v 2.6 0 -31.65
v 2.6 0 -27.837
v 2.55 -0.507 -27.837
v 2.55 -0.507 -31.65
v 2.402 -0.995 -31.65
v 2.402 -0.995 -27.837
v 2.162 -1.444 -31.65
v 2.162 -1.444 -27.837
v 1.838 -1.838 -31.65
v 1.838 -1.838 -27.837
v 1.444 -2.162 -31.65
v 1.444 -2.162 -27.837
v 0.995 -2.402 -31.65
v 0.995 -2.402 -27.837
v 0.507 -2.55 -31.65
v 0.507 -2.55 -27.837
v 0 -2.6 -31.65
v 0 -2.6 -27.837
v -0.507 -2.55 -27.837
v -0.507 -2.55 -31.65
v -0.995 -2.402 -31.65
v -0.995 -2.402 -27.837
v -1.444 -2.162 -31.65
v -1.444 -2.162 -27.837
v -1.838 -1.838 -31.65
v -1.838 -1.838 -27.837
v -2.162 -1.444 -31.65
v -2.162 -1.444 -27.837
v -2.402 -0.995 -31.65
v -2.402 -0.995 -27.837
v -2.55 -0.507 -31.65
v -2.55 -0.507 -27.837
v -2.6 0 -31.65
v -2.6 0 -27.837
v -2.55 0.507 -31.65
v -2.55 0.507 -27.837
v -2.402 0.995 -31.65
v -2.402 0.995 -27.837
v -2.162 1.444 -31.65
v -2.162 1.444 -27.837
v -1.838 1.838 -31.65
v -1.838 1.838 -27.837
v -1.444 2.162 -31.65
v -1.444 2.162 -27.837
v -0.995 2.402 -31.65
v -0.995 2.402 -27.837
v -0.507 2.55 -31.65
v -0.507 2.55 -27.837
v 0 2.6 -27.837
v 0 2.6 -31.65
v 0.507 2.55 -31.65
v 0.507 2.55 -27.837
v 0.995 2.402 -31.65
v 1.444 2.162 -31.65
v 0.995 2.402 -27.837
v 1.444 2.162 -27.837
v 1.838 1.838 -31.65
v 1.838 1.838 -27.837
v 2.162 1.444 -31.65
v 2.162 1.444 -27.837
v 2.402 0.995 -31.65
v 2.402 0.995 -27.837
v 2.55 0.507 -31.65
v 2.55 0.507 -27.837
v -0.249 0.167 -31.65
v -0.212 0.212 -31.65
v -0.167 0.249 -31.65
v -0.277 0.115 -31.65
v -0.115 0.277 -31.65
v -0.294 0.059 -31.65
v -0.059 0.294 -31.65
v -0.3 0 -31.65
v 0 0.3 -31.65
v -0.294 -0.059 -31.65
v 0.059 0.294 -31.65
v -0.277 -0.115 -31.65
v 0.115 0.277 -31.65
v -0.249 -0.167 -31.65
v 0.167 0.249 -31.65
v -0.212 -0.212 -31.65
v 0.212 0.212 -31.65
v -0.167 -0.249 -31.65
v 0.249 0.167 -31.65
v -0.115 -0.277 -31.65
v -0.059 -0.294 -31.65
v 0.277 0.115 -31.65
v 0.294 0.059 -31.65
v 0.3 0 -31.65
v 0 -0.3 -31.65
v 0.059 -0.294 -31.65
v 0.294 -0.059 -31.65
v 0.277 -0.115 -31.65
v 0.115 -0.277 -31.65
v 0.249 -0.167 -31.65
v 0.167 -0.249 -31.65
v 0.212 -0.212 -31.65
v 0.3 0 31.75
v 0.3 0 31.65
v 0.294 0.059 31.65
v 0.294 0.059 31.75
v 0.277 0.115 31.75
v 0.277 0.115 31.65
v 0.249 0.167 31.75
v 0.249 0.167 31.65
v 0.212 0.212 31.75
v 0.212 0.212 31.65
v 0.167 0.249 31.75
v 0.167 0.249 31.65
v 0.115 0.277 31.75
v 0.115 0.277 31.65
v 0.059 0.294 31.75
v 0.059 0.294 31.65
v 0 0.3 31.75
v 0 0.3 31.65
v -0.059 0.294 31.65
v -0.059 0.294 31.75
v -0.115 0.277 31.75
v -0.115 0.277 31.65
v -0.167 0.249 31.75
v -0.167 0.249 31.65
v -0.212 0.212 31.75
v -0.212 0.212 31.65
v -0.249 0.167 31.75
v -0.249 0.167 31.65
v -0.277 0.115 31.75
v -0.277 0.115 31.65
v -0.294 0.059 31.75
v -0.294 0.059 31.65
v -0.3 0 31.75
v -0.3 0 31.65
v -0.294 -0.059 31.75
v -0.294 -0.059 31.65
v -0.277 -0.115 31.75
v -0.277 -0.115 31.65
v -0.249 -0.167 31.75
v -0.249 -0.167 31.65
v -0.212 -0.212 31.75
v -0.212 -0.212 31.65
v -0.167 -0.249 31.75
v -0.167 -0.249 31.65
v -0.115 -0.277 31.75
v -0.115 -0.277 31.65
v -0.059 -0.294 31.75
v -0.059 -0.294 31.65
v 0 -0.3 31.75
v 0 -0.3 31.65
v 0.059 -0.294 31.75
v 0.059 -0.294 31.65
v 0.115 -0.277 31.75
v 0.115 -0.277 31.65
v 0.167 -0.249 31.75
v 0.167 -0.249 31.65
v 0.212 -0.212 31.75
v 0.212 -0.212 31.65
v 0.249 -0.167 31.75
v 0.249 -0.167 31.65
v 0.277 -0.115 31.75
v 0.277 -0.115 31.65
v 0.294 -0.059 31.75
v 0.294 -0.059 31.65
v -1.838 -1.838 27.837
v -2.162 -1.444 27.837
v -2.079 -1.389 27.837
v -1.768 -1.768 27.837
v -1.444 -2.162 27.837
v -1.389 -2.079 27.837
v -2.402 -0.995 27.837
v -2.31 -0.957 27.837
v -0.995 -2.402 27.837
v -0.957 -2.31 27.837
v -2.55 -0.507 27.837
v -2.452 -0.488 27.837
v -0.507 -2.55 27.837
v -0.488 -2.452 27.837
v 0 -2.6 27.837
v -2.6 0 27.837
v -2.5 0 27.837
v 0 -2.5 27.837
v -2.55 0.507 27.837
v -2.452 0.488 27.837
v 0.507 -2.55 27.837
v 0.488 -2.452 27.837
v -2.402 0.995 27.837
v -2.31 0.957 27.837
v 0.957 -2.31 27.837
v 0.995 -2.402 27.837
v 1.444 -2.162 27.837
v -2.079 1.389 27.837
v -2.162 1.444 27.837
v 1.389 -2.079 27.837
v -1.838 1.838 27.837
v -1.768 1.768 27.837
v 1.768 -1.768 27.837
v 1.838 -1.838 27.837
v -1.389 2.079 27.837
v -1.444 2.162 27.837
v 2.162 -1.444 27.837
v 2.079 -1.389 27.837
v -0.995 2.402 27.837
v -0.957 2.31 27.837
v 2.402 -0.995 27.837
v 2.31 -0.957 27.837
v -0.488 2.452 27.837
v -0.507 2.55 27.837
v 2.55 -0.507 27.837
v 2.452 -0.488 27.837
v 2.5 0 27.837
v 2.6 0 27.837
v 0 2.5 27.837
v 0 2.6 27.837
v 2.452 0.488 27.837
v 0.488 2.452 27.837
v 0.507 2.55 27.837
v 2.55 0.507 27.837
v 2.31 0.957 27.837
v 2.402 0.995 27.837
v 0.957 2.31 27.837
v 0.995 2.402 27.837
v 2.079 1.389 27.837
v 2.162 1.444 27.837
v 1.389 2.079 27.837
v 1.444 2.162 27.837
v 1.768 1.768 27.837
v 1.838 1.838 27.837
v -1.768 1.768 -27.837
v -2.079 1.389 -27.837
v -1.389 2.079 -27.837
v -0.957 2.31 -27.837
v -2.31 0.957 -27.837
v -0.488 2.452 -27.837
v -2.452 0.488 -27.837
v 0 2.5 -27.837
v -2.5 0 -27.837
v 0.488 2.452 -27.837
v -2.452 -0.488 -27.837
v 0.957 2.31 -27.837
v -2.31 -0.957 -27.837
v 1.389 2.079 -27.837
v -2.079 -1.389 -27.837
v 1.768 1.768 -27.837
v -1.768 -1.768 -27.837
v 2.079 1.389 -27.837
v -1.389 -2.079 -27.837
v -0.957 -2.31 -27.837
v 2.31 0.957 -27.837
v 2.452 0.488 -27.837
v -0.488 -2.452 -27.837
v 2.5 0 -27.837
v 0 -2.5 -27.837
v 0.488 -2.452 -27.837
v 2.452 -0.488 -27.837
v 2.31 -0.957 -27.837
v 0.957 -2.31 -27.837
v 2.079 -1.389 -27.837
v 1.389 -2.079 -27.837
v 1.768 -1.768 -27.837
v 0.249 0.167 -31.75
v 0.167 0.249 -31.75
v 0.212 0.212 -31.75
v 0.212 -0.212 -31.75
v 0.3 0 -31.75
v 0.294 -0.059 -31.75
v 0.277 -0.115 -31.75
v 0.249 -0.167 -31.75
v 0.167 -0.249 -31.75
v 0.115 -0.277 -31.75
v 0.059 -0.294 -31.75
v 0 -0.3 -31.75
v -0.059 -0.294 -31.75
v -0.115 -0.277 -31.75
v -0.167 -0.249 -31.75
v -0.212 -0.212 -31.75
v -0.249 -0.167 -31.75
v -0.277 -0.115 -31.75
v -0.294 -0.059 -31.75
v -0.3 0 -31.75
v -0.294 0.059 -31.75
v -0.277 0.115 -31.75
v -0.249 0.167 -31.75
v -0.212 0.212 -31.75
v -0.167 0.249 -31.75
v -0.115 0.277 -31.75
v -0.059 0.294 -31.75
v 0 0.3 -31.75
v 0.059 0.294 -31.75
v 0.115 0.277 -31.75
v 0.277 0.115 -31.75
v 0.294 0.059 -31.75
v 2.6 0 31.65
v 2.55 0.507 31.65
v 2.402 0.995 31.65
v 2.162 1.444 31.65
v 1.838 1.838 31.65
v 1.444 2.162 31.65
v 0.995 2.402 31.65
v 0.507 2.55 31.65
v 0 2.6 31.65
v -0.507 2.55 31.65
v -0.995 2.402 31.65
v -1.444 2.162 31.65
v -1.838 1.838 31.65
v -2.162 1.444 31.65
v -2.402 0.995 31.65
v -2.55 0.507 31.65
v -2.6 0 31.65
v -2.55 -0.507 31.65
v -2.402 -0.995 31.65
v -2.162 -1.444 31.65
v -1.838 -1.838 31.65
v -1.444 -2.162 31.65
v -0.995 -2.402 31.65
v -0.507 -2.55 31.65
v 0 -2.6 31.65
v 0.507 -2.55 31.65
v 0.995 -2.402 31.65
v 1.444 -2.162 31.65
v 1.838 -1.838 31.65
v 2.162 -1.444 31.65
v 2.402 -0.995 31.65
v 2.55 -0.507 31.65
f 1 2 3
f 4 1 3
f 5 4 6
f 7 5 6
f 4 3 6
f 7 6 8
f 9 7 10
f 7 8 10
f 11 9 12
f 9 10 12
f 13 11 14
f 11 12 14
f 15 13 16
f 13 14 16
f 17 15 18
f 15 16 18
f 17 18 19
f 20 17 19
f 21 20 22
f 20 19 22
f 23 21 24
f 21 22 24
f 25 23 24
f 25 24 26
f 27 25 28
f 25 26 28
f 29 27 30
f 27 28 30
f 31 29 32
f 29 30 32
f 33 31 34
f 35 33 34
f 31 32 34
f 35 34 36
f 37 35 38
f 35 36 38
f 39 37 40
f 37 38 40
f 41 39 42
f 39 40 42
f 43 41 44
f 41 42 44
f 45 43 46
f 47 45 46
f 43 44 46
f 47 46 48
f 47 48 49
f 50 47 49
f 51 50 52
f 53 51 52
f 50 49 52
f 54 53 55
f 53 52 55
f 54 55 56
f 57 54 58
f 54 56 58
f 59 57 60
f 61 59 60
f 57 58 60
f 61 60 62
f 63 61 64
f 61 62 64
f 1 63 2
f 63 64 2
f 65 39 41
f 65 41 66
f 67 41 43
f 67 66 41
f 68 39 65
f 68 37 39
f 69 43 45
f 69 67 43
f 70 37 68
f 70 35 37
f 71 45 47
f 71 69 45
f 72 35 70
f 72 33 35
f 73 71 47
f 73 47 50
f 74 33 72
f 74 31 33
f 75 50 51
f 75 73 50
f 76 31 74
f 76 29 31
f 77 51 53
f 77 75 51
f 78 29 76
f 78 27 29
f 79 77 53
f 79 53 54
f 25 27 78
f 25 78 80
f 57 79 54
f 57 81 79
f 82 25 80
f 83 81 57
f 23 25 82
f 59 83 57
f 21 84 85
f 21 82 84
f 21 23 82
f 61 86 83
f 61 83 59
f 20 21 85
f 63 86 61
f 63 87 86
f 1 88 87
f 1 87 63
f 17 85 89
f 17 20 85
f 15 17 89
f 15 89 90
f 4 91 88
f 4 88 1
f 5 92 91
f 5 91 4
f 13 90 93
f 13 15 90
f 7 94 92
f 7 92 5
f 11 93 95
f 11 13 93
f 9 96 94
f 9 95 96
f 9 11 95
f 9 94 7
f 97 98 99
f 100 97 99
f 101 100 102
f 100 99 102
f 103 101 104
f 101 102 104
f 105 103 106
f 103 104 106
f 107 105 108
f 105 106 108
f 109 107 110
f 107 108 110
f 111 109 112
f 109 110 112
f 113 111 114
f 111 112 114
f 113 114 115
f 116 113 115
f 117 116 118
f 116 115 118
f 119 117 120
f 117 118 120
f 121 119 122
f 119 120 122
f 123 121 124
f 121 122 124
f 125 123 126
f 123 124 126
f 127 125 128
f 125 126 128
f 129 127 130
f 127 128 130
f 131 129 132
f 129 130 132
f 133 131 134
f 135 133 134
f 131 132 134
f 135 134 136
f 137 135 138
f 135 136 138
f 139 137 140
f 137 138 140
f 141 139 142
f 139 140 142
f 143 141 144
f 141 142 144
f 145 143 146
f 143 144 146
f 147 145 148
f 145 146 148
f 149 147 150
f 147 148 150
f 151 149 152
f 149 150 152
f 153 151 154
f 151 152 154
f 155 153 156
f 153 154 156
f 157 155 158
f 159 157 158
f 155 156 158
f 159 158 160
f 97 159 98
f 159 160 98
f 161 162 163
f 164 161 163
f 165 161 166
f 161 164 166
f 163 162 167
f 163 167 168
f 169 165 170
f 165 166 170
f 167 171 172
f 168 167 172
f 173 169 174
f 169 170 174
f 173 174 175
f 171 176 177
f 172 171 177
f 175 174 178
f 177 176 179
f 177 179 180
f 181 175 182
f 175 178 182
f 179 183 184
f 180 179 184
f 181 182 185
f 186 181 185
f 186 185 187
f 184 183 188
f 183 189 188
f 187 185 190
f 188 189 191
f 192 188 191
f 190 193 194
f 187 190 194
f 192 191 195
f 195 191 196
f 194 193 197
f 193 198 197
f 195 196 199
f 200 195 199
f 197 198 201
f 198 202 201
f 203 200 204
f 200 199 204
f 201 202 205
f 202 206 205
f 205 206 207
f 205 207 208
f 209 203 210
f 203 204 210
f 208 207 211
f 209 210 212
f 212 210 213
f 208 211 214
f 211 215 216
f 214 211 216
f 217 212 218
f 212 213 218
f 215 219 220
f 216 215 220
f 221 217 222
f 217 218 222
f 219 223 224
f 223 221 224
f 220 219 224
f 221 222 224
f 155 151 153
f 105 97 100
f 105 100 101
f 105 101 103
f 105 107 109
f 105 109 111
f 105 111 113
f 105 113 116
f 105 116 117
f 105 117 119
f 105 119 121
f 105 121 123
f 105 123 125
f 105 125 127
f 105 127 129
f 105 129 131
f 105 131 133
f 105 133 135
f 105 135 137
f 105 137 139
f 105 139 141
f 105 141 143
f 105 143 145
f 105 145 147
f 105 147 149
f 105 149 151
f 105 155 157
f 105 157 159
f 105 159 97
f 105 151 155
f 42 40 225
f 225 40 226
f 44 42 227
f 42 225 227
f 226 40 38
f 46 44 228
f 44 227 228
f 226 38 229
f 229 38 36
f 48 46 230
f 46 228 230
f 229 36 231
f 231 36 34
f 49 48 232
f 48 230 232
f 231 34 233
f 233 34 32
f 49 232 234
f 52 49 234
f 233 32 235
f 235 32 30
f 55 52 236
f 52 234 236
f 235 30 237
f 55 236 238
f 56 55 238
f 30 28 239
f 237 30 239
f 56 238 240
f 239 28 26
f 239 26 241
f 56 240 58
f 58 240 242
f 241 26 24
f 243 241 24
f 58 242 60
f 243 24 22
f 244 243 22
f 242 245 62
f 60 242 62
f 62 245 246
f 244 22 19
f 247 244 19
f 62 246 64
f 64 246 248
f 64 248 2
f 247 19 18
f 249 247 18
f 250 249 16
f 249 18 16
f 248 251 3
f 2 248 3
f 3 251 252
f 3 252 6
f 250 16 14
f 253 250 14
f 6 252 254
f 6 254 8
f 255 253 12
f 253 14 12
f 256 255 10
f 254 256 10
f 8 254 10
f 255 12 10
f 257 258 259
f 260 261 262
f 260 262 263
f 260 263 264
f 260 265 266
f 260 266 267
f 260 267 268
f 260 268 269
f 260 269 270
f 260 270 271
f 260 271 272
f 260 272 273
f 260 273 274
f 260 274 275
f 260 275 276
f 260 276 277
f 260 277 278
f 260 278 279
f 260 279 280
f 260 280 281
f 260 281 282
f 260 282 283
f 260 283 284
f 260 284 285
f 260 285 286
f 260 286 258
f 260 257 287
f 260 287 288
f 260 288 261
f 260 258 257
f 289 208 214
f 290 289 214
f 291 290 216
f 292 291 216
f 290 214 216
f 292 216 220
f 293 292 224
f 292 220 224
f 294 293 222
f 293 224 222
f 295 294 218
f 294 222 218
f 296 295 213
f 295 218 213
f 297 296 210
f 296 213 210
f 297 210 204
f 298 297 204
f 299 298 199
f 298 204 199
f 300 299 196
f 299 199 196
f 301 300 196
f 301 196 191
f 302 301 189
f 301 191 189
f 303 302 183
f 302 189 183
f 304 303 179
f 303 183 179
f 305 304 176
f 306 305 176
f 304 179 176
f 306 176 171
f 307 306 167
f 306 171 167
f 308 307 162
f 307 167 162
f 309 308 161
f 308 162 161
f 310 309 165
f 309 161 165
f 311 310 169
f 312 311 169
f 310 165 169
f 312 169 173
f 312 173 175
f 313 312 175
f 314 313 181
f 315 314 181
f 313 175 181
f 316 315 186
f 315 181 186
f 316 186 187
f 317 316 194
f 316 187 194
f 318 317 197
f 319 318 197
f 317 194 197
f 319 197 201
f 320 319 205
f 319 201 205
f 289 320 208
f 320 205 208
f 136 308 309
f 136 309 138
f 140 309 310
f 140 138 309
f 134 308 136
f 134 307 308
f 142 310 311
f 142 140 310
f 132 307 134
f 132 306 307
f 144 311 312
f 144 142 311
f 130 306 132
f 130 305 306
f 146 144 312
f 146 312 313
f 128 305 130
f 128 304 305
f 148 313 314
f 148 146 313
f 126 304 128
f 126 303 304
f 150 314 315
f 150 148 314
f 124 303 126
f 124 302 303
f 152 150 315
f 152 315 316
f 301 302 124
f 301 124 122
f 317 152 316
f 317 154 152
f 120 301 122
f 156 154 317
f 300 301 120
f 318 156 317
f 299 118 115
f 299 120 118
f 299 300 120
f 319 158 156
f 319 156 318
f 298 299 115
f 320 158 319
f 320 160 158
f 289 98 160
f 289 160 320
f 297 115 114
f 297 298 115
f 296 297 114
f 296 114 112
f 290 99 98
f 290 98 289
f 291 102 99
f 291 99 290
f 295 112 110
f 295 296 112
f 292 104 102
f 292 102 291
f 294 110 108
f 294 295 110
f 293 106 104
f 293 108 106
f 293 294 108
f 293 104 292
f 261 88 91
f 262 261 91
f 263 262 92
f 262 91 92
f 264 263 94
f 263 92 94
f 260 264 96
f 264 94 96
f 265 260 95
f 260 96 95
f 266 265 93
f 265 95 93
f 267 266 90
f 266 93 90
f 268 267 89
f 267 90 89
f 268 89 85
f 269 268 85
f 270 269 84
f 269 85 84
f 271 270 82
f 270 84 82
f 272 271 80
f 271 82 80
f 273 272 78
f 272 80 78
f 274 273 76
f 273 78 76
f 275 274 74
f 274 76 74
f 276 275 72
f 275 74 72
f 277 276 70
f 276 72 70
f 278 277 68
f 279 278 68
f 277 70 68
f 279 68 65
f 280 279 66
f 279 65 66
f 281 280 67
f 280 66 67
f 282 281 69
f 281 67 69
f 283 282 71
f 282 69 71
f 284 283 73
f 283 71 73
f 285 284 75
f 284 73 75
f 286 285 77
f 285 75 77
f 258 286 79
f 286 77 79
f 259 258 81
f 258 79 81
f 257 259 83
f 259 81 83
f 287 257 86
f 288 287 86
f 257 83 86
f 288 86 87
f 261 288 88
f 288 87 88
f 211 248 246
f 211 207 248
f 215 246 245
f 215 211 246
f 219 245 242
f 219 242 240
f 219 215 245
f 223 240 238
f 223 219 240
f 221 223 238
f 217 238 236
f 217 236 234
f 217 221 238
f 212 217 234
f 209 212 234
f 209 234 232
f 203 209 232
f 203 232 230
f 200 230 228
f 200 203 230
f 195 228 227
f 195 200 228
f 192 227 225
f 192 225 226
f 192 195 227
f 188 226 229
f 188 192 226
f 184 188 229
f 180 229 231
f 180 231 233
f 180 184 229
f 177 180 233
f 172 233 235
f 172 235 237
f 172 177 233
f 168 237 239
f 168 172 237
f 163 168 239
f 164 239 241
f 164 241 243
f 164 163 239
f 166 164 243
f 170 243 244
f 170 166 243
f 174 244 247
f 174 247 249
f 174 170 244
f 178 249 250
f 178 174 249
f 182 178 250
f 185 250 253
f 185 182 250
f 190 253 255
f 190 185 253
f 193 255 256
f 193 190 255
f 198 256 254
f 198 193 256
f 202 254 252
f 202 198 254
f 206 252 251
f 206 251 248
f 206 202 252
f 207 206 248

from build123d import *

# Parameters (mm, degrees)
F0_R     = 2.5
F1_DEPTH = 27.836615
F2_R     = 2.6
F2_R_2   = 2.5
F3_DEPTH = 3.813385
F4_R     = 2.6
F4_R_2   = 2.5
F5_DEPTH = 3.813385
F6_R     = 0.3
F7_DEPTH = 0.1
F8_R     = 0.3
F9_DEPTH = 0.1


with BuildPart() as f1:
    # F0 (on Top) → F1 (new body, symmetric)
    with BuildSketch(Plane.XY):
        Circle(F0_R)
    extrude(amount=F1_DEPTH, both=True)

    # F2 (on face) → F3 (join)
    with BuildSketch(Plane.XY.offset(27.836615)):
        Circle(F2_R)
        Circle(F2_R_2, mode=Mode.SUBTRACT)
        Circle(F2_R_2)
    extrude(amount=F3_DEPTH)

    # F4 (on face) → F5 (join)
    with BuildSketch(Plane(origin=(0, 0, -27.836615), x_dir=(1, 0, 0), z_dir=(0, 0, -1))):
        Circle(F4_R)
        Circle(F4_R_2, mode=Mode.SUBTRACT)
        Circle(F4_R_2)
    extrude(amount=F5_DEPTH)

    # F6 (on face) → F7 (join)
    with BuildSketch(Plane(origin=(0, 0, -31.65), x_dir=(1, 0, 0), z_dir=(0, 0, -1))):
        Circle(F6_R)
    extrude(amount=F7_DEPTH)

    # F8 (on face) → F9 (join)
    with BuildSketch(Plane.XY.offset(31.65)):
        Circle(F8_R)
    extrude(amount=F9_DEPTH)


solid = f1.part
